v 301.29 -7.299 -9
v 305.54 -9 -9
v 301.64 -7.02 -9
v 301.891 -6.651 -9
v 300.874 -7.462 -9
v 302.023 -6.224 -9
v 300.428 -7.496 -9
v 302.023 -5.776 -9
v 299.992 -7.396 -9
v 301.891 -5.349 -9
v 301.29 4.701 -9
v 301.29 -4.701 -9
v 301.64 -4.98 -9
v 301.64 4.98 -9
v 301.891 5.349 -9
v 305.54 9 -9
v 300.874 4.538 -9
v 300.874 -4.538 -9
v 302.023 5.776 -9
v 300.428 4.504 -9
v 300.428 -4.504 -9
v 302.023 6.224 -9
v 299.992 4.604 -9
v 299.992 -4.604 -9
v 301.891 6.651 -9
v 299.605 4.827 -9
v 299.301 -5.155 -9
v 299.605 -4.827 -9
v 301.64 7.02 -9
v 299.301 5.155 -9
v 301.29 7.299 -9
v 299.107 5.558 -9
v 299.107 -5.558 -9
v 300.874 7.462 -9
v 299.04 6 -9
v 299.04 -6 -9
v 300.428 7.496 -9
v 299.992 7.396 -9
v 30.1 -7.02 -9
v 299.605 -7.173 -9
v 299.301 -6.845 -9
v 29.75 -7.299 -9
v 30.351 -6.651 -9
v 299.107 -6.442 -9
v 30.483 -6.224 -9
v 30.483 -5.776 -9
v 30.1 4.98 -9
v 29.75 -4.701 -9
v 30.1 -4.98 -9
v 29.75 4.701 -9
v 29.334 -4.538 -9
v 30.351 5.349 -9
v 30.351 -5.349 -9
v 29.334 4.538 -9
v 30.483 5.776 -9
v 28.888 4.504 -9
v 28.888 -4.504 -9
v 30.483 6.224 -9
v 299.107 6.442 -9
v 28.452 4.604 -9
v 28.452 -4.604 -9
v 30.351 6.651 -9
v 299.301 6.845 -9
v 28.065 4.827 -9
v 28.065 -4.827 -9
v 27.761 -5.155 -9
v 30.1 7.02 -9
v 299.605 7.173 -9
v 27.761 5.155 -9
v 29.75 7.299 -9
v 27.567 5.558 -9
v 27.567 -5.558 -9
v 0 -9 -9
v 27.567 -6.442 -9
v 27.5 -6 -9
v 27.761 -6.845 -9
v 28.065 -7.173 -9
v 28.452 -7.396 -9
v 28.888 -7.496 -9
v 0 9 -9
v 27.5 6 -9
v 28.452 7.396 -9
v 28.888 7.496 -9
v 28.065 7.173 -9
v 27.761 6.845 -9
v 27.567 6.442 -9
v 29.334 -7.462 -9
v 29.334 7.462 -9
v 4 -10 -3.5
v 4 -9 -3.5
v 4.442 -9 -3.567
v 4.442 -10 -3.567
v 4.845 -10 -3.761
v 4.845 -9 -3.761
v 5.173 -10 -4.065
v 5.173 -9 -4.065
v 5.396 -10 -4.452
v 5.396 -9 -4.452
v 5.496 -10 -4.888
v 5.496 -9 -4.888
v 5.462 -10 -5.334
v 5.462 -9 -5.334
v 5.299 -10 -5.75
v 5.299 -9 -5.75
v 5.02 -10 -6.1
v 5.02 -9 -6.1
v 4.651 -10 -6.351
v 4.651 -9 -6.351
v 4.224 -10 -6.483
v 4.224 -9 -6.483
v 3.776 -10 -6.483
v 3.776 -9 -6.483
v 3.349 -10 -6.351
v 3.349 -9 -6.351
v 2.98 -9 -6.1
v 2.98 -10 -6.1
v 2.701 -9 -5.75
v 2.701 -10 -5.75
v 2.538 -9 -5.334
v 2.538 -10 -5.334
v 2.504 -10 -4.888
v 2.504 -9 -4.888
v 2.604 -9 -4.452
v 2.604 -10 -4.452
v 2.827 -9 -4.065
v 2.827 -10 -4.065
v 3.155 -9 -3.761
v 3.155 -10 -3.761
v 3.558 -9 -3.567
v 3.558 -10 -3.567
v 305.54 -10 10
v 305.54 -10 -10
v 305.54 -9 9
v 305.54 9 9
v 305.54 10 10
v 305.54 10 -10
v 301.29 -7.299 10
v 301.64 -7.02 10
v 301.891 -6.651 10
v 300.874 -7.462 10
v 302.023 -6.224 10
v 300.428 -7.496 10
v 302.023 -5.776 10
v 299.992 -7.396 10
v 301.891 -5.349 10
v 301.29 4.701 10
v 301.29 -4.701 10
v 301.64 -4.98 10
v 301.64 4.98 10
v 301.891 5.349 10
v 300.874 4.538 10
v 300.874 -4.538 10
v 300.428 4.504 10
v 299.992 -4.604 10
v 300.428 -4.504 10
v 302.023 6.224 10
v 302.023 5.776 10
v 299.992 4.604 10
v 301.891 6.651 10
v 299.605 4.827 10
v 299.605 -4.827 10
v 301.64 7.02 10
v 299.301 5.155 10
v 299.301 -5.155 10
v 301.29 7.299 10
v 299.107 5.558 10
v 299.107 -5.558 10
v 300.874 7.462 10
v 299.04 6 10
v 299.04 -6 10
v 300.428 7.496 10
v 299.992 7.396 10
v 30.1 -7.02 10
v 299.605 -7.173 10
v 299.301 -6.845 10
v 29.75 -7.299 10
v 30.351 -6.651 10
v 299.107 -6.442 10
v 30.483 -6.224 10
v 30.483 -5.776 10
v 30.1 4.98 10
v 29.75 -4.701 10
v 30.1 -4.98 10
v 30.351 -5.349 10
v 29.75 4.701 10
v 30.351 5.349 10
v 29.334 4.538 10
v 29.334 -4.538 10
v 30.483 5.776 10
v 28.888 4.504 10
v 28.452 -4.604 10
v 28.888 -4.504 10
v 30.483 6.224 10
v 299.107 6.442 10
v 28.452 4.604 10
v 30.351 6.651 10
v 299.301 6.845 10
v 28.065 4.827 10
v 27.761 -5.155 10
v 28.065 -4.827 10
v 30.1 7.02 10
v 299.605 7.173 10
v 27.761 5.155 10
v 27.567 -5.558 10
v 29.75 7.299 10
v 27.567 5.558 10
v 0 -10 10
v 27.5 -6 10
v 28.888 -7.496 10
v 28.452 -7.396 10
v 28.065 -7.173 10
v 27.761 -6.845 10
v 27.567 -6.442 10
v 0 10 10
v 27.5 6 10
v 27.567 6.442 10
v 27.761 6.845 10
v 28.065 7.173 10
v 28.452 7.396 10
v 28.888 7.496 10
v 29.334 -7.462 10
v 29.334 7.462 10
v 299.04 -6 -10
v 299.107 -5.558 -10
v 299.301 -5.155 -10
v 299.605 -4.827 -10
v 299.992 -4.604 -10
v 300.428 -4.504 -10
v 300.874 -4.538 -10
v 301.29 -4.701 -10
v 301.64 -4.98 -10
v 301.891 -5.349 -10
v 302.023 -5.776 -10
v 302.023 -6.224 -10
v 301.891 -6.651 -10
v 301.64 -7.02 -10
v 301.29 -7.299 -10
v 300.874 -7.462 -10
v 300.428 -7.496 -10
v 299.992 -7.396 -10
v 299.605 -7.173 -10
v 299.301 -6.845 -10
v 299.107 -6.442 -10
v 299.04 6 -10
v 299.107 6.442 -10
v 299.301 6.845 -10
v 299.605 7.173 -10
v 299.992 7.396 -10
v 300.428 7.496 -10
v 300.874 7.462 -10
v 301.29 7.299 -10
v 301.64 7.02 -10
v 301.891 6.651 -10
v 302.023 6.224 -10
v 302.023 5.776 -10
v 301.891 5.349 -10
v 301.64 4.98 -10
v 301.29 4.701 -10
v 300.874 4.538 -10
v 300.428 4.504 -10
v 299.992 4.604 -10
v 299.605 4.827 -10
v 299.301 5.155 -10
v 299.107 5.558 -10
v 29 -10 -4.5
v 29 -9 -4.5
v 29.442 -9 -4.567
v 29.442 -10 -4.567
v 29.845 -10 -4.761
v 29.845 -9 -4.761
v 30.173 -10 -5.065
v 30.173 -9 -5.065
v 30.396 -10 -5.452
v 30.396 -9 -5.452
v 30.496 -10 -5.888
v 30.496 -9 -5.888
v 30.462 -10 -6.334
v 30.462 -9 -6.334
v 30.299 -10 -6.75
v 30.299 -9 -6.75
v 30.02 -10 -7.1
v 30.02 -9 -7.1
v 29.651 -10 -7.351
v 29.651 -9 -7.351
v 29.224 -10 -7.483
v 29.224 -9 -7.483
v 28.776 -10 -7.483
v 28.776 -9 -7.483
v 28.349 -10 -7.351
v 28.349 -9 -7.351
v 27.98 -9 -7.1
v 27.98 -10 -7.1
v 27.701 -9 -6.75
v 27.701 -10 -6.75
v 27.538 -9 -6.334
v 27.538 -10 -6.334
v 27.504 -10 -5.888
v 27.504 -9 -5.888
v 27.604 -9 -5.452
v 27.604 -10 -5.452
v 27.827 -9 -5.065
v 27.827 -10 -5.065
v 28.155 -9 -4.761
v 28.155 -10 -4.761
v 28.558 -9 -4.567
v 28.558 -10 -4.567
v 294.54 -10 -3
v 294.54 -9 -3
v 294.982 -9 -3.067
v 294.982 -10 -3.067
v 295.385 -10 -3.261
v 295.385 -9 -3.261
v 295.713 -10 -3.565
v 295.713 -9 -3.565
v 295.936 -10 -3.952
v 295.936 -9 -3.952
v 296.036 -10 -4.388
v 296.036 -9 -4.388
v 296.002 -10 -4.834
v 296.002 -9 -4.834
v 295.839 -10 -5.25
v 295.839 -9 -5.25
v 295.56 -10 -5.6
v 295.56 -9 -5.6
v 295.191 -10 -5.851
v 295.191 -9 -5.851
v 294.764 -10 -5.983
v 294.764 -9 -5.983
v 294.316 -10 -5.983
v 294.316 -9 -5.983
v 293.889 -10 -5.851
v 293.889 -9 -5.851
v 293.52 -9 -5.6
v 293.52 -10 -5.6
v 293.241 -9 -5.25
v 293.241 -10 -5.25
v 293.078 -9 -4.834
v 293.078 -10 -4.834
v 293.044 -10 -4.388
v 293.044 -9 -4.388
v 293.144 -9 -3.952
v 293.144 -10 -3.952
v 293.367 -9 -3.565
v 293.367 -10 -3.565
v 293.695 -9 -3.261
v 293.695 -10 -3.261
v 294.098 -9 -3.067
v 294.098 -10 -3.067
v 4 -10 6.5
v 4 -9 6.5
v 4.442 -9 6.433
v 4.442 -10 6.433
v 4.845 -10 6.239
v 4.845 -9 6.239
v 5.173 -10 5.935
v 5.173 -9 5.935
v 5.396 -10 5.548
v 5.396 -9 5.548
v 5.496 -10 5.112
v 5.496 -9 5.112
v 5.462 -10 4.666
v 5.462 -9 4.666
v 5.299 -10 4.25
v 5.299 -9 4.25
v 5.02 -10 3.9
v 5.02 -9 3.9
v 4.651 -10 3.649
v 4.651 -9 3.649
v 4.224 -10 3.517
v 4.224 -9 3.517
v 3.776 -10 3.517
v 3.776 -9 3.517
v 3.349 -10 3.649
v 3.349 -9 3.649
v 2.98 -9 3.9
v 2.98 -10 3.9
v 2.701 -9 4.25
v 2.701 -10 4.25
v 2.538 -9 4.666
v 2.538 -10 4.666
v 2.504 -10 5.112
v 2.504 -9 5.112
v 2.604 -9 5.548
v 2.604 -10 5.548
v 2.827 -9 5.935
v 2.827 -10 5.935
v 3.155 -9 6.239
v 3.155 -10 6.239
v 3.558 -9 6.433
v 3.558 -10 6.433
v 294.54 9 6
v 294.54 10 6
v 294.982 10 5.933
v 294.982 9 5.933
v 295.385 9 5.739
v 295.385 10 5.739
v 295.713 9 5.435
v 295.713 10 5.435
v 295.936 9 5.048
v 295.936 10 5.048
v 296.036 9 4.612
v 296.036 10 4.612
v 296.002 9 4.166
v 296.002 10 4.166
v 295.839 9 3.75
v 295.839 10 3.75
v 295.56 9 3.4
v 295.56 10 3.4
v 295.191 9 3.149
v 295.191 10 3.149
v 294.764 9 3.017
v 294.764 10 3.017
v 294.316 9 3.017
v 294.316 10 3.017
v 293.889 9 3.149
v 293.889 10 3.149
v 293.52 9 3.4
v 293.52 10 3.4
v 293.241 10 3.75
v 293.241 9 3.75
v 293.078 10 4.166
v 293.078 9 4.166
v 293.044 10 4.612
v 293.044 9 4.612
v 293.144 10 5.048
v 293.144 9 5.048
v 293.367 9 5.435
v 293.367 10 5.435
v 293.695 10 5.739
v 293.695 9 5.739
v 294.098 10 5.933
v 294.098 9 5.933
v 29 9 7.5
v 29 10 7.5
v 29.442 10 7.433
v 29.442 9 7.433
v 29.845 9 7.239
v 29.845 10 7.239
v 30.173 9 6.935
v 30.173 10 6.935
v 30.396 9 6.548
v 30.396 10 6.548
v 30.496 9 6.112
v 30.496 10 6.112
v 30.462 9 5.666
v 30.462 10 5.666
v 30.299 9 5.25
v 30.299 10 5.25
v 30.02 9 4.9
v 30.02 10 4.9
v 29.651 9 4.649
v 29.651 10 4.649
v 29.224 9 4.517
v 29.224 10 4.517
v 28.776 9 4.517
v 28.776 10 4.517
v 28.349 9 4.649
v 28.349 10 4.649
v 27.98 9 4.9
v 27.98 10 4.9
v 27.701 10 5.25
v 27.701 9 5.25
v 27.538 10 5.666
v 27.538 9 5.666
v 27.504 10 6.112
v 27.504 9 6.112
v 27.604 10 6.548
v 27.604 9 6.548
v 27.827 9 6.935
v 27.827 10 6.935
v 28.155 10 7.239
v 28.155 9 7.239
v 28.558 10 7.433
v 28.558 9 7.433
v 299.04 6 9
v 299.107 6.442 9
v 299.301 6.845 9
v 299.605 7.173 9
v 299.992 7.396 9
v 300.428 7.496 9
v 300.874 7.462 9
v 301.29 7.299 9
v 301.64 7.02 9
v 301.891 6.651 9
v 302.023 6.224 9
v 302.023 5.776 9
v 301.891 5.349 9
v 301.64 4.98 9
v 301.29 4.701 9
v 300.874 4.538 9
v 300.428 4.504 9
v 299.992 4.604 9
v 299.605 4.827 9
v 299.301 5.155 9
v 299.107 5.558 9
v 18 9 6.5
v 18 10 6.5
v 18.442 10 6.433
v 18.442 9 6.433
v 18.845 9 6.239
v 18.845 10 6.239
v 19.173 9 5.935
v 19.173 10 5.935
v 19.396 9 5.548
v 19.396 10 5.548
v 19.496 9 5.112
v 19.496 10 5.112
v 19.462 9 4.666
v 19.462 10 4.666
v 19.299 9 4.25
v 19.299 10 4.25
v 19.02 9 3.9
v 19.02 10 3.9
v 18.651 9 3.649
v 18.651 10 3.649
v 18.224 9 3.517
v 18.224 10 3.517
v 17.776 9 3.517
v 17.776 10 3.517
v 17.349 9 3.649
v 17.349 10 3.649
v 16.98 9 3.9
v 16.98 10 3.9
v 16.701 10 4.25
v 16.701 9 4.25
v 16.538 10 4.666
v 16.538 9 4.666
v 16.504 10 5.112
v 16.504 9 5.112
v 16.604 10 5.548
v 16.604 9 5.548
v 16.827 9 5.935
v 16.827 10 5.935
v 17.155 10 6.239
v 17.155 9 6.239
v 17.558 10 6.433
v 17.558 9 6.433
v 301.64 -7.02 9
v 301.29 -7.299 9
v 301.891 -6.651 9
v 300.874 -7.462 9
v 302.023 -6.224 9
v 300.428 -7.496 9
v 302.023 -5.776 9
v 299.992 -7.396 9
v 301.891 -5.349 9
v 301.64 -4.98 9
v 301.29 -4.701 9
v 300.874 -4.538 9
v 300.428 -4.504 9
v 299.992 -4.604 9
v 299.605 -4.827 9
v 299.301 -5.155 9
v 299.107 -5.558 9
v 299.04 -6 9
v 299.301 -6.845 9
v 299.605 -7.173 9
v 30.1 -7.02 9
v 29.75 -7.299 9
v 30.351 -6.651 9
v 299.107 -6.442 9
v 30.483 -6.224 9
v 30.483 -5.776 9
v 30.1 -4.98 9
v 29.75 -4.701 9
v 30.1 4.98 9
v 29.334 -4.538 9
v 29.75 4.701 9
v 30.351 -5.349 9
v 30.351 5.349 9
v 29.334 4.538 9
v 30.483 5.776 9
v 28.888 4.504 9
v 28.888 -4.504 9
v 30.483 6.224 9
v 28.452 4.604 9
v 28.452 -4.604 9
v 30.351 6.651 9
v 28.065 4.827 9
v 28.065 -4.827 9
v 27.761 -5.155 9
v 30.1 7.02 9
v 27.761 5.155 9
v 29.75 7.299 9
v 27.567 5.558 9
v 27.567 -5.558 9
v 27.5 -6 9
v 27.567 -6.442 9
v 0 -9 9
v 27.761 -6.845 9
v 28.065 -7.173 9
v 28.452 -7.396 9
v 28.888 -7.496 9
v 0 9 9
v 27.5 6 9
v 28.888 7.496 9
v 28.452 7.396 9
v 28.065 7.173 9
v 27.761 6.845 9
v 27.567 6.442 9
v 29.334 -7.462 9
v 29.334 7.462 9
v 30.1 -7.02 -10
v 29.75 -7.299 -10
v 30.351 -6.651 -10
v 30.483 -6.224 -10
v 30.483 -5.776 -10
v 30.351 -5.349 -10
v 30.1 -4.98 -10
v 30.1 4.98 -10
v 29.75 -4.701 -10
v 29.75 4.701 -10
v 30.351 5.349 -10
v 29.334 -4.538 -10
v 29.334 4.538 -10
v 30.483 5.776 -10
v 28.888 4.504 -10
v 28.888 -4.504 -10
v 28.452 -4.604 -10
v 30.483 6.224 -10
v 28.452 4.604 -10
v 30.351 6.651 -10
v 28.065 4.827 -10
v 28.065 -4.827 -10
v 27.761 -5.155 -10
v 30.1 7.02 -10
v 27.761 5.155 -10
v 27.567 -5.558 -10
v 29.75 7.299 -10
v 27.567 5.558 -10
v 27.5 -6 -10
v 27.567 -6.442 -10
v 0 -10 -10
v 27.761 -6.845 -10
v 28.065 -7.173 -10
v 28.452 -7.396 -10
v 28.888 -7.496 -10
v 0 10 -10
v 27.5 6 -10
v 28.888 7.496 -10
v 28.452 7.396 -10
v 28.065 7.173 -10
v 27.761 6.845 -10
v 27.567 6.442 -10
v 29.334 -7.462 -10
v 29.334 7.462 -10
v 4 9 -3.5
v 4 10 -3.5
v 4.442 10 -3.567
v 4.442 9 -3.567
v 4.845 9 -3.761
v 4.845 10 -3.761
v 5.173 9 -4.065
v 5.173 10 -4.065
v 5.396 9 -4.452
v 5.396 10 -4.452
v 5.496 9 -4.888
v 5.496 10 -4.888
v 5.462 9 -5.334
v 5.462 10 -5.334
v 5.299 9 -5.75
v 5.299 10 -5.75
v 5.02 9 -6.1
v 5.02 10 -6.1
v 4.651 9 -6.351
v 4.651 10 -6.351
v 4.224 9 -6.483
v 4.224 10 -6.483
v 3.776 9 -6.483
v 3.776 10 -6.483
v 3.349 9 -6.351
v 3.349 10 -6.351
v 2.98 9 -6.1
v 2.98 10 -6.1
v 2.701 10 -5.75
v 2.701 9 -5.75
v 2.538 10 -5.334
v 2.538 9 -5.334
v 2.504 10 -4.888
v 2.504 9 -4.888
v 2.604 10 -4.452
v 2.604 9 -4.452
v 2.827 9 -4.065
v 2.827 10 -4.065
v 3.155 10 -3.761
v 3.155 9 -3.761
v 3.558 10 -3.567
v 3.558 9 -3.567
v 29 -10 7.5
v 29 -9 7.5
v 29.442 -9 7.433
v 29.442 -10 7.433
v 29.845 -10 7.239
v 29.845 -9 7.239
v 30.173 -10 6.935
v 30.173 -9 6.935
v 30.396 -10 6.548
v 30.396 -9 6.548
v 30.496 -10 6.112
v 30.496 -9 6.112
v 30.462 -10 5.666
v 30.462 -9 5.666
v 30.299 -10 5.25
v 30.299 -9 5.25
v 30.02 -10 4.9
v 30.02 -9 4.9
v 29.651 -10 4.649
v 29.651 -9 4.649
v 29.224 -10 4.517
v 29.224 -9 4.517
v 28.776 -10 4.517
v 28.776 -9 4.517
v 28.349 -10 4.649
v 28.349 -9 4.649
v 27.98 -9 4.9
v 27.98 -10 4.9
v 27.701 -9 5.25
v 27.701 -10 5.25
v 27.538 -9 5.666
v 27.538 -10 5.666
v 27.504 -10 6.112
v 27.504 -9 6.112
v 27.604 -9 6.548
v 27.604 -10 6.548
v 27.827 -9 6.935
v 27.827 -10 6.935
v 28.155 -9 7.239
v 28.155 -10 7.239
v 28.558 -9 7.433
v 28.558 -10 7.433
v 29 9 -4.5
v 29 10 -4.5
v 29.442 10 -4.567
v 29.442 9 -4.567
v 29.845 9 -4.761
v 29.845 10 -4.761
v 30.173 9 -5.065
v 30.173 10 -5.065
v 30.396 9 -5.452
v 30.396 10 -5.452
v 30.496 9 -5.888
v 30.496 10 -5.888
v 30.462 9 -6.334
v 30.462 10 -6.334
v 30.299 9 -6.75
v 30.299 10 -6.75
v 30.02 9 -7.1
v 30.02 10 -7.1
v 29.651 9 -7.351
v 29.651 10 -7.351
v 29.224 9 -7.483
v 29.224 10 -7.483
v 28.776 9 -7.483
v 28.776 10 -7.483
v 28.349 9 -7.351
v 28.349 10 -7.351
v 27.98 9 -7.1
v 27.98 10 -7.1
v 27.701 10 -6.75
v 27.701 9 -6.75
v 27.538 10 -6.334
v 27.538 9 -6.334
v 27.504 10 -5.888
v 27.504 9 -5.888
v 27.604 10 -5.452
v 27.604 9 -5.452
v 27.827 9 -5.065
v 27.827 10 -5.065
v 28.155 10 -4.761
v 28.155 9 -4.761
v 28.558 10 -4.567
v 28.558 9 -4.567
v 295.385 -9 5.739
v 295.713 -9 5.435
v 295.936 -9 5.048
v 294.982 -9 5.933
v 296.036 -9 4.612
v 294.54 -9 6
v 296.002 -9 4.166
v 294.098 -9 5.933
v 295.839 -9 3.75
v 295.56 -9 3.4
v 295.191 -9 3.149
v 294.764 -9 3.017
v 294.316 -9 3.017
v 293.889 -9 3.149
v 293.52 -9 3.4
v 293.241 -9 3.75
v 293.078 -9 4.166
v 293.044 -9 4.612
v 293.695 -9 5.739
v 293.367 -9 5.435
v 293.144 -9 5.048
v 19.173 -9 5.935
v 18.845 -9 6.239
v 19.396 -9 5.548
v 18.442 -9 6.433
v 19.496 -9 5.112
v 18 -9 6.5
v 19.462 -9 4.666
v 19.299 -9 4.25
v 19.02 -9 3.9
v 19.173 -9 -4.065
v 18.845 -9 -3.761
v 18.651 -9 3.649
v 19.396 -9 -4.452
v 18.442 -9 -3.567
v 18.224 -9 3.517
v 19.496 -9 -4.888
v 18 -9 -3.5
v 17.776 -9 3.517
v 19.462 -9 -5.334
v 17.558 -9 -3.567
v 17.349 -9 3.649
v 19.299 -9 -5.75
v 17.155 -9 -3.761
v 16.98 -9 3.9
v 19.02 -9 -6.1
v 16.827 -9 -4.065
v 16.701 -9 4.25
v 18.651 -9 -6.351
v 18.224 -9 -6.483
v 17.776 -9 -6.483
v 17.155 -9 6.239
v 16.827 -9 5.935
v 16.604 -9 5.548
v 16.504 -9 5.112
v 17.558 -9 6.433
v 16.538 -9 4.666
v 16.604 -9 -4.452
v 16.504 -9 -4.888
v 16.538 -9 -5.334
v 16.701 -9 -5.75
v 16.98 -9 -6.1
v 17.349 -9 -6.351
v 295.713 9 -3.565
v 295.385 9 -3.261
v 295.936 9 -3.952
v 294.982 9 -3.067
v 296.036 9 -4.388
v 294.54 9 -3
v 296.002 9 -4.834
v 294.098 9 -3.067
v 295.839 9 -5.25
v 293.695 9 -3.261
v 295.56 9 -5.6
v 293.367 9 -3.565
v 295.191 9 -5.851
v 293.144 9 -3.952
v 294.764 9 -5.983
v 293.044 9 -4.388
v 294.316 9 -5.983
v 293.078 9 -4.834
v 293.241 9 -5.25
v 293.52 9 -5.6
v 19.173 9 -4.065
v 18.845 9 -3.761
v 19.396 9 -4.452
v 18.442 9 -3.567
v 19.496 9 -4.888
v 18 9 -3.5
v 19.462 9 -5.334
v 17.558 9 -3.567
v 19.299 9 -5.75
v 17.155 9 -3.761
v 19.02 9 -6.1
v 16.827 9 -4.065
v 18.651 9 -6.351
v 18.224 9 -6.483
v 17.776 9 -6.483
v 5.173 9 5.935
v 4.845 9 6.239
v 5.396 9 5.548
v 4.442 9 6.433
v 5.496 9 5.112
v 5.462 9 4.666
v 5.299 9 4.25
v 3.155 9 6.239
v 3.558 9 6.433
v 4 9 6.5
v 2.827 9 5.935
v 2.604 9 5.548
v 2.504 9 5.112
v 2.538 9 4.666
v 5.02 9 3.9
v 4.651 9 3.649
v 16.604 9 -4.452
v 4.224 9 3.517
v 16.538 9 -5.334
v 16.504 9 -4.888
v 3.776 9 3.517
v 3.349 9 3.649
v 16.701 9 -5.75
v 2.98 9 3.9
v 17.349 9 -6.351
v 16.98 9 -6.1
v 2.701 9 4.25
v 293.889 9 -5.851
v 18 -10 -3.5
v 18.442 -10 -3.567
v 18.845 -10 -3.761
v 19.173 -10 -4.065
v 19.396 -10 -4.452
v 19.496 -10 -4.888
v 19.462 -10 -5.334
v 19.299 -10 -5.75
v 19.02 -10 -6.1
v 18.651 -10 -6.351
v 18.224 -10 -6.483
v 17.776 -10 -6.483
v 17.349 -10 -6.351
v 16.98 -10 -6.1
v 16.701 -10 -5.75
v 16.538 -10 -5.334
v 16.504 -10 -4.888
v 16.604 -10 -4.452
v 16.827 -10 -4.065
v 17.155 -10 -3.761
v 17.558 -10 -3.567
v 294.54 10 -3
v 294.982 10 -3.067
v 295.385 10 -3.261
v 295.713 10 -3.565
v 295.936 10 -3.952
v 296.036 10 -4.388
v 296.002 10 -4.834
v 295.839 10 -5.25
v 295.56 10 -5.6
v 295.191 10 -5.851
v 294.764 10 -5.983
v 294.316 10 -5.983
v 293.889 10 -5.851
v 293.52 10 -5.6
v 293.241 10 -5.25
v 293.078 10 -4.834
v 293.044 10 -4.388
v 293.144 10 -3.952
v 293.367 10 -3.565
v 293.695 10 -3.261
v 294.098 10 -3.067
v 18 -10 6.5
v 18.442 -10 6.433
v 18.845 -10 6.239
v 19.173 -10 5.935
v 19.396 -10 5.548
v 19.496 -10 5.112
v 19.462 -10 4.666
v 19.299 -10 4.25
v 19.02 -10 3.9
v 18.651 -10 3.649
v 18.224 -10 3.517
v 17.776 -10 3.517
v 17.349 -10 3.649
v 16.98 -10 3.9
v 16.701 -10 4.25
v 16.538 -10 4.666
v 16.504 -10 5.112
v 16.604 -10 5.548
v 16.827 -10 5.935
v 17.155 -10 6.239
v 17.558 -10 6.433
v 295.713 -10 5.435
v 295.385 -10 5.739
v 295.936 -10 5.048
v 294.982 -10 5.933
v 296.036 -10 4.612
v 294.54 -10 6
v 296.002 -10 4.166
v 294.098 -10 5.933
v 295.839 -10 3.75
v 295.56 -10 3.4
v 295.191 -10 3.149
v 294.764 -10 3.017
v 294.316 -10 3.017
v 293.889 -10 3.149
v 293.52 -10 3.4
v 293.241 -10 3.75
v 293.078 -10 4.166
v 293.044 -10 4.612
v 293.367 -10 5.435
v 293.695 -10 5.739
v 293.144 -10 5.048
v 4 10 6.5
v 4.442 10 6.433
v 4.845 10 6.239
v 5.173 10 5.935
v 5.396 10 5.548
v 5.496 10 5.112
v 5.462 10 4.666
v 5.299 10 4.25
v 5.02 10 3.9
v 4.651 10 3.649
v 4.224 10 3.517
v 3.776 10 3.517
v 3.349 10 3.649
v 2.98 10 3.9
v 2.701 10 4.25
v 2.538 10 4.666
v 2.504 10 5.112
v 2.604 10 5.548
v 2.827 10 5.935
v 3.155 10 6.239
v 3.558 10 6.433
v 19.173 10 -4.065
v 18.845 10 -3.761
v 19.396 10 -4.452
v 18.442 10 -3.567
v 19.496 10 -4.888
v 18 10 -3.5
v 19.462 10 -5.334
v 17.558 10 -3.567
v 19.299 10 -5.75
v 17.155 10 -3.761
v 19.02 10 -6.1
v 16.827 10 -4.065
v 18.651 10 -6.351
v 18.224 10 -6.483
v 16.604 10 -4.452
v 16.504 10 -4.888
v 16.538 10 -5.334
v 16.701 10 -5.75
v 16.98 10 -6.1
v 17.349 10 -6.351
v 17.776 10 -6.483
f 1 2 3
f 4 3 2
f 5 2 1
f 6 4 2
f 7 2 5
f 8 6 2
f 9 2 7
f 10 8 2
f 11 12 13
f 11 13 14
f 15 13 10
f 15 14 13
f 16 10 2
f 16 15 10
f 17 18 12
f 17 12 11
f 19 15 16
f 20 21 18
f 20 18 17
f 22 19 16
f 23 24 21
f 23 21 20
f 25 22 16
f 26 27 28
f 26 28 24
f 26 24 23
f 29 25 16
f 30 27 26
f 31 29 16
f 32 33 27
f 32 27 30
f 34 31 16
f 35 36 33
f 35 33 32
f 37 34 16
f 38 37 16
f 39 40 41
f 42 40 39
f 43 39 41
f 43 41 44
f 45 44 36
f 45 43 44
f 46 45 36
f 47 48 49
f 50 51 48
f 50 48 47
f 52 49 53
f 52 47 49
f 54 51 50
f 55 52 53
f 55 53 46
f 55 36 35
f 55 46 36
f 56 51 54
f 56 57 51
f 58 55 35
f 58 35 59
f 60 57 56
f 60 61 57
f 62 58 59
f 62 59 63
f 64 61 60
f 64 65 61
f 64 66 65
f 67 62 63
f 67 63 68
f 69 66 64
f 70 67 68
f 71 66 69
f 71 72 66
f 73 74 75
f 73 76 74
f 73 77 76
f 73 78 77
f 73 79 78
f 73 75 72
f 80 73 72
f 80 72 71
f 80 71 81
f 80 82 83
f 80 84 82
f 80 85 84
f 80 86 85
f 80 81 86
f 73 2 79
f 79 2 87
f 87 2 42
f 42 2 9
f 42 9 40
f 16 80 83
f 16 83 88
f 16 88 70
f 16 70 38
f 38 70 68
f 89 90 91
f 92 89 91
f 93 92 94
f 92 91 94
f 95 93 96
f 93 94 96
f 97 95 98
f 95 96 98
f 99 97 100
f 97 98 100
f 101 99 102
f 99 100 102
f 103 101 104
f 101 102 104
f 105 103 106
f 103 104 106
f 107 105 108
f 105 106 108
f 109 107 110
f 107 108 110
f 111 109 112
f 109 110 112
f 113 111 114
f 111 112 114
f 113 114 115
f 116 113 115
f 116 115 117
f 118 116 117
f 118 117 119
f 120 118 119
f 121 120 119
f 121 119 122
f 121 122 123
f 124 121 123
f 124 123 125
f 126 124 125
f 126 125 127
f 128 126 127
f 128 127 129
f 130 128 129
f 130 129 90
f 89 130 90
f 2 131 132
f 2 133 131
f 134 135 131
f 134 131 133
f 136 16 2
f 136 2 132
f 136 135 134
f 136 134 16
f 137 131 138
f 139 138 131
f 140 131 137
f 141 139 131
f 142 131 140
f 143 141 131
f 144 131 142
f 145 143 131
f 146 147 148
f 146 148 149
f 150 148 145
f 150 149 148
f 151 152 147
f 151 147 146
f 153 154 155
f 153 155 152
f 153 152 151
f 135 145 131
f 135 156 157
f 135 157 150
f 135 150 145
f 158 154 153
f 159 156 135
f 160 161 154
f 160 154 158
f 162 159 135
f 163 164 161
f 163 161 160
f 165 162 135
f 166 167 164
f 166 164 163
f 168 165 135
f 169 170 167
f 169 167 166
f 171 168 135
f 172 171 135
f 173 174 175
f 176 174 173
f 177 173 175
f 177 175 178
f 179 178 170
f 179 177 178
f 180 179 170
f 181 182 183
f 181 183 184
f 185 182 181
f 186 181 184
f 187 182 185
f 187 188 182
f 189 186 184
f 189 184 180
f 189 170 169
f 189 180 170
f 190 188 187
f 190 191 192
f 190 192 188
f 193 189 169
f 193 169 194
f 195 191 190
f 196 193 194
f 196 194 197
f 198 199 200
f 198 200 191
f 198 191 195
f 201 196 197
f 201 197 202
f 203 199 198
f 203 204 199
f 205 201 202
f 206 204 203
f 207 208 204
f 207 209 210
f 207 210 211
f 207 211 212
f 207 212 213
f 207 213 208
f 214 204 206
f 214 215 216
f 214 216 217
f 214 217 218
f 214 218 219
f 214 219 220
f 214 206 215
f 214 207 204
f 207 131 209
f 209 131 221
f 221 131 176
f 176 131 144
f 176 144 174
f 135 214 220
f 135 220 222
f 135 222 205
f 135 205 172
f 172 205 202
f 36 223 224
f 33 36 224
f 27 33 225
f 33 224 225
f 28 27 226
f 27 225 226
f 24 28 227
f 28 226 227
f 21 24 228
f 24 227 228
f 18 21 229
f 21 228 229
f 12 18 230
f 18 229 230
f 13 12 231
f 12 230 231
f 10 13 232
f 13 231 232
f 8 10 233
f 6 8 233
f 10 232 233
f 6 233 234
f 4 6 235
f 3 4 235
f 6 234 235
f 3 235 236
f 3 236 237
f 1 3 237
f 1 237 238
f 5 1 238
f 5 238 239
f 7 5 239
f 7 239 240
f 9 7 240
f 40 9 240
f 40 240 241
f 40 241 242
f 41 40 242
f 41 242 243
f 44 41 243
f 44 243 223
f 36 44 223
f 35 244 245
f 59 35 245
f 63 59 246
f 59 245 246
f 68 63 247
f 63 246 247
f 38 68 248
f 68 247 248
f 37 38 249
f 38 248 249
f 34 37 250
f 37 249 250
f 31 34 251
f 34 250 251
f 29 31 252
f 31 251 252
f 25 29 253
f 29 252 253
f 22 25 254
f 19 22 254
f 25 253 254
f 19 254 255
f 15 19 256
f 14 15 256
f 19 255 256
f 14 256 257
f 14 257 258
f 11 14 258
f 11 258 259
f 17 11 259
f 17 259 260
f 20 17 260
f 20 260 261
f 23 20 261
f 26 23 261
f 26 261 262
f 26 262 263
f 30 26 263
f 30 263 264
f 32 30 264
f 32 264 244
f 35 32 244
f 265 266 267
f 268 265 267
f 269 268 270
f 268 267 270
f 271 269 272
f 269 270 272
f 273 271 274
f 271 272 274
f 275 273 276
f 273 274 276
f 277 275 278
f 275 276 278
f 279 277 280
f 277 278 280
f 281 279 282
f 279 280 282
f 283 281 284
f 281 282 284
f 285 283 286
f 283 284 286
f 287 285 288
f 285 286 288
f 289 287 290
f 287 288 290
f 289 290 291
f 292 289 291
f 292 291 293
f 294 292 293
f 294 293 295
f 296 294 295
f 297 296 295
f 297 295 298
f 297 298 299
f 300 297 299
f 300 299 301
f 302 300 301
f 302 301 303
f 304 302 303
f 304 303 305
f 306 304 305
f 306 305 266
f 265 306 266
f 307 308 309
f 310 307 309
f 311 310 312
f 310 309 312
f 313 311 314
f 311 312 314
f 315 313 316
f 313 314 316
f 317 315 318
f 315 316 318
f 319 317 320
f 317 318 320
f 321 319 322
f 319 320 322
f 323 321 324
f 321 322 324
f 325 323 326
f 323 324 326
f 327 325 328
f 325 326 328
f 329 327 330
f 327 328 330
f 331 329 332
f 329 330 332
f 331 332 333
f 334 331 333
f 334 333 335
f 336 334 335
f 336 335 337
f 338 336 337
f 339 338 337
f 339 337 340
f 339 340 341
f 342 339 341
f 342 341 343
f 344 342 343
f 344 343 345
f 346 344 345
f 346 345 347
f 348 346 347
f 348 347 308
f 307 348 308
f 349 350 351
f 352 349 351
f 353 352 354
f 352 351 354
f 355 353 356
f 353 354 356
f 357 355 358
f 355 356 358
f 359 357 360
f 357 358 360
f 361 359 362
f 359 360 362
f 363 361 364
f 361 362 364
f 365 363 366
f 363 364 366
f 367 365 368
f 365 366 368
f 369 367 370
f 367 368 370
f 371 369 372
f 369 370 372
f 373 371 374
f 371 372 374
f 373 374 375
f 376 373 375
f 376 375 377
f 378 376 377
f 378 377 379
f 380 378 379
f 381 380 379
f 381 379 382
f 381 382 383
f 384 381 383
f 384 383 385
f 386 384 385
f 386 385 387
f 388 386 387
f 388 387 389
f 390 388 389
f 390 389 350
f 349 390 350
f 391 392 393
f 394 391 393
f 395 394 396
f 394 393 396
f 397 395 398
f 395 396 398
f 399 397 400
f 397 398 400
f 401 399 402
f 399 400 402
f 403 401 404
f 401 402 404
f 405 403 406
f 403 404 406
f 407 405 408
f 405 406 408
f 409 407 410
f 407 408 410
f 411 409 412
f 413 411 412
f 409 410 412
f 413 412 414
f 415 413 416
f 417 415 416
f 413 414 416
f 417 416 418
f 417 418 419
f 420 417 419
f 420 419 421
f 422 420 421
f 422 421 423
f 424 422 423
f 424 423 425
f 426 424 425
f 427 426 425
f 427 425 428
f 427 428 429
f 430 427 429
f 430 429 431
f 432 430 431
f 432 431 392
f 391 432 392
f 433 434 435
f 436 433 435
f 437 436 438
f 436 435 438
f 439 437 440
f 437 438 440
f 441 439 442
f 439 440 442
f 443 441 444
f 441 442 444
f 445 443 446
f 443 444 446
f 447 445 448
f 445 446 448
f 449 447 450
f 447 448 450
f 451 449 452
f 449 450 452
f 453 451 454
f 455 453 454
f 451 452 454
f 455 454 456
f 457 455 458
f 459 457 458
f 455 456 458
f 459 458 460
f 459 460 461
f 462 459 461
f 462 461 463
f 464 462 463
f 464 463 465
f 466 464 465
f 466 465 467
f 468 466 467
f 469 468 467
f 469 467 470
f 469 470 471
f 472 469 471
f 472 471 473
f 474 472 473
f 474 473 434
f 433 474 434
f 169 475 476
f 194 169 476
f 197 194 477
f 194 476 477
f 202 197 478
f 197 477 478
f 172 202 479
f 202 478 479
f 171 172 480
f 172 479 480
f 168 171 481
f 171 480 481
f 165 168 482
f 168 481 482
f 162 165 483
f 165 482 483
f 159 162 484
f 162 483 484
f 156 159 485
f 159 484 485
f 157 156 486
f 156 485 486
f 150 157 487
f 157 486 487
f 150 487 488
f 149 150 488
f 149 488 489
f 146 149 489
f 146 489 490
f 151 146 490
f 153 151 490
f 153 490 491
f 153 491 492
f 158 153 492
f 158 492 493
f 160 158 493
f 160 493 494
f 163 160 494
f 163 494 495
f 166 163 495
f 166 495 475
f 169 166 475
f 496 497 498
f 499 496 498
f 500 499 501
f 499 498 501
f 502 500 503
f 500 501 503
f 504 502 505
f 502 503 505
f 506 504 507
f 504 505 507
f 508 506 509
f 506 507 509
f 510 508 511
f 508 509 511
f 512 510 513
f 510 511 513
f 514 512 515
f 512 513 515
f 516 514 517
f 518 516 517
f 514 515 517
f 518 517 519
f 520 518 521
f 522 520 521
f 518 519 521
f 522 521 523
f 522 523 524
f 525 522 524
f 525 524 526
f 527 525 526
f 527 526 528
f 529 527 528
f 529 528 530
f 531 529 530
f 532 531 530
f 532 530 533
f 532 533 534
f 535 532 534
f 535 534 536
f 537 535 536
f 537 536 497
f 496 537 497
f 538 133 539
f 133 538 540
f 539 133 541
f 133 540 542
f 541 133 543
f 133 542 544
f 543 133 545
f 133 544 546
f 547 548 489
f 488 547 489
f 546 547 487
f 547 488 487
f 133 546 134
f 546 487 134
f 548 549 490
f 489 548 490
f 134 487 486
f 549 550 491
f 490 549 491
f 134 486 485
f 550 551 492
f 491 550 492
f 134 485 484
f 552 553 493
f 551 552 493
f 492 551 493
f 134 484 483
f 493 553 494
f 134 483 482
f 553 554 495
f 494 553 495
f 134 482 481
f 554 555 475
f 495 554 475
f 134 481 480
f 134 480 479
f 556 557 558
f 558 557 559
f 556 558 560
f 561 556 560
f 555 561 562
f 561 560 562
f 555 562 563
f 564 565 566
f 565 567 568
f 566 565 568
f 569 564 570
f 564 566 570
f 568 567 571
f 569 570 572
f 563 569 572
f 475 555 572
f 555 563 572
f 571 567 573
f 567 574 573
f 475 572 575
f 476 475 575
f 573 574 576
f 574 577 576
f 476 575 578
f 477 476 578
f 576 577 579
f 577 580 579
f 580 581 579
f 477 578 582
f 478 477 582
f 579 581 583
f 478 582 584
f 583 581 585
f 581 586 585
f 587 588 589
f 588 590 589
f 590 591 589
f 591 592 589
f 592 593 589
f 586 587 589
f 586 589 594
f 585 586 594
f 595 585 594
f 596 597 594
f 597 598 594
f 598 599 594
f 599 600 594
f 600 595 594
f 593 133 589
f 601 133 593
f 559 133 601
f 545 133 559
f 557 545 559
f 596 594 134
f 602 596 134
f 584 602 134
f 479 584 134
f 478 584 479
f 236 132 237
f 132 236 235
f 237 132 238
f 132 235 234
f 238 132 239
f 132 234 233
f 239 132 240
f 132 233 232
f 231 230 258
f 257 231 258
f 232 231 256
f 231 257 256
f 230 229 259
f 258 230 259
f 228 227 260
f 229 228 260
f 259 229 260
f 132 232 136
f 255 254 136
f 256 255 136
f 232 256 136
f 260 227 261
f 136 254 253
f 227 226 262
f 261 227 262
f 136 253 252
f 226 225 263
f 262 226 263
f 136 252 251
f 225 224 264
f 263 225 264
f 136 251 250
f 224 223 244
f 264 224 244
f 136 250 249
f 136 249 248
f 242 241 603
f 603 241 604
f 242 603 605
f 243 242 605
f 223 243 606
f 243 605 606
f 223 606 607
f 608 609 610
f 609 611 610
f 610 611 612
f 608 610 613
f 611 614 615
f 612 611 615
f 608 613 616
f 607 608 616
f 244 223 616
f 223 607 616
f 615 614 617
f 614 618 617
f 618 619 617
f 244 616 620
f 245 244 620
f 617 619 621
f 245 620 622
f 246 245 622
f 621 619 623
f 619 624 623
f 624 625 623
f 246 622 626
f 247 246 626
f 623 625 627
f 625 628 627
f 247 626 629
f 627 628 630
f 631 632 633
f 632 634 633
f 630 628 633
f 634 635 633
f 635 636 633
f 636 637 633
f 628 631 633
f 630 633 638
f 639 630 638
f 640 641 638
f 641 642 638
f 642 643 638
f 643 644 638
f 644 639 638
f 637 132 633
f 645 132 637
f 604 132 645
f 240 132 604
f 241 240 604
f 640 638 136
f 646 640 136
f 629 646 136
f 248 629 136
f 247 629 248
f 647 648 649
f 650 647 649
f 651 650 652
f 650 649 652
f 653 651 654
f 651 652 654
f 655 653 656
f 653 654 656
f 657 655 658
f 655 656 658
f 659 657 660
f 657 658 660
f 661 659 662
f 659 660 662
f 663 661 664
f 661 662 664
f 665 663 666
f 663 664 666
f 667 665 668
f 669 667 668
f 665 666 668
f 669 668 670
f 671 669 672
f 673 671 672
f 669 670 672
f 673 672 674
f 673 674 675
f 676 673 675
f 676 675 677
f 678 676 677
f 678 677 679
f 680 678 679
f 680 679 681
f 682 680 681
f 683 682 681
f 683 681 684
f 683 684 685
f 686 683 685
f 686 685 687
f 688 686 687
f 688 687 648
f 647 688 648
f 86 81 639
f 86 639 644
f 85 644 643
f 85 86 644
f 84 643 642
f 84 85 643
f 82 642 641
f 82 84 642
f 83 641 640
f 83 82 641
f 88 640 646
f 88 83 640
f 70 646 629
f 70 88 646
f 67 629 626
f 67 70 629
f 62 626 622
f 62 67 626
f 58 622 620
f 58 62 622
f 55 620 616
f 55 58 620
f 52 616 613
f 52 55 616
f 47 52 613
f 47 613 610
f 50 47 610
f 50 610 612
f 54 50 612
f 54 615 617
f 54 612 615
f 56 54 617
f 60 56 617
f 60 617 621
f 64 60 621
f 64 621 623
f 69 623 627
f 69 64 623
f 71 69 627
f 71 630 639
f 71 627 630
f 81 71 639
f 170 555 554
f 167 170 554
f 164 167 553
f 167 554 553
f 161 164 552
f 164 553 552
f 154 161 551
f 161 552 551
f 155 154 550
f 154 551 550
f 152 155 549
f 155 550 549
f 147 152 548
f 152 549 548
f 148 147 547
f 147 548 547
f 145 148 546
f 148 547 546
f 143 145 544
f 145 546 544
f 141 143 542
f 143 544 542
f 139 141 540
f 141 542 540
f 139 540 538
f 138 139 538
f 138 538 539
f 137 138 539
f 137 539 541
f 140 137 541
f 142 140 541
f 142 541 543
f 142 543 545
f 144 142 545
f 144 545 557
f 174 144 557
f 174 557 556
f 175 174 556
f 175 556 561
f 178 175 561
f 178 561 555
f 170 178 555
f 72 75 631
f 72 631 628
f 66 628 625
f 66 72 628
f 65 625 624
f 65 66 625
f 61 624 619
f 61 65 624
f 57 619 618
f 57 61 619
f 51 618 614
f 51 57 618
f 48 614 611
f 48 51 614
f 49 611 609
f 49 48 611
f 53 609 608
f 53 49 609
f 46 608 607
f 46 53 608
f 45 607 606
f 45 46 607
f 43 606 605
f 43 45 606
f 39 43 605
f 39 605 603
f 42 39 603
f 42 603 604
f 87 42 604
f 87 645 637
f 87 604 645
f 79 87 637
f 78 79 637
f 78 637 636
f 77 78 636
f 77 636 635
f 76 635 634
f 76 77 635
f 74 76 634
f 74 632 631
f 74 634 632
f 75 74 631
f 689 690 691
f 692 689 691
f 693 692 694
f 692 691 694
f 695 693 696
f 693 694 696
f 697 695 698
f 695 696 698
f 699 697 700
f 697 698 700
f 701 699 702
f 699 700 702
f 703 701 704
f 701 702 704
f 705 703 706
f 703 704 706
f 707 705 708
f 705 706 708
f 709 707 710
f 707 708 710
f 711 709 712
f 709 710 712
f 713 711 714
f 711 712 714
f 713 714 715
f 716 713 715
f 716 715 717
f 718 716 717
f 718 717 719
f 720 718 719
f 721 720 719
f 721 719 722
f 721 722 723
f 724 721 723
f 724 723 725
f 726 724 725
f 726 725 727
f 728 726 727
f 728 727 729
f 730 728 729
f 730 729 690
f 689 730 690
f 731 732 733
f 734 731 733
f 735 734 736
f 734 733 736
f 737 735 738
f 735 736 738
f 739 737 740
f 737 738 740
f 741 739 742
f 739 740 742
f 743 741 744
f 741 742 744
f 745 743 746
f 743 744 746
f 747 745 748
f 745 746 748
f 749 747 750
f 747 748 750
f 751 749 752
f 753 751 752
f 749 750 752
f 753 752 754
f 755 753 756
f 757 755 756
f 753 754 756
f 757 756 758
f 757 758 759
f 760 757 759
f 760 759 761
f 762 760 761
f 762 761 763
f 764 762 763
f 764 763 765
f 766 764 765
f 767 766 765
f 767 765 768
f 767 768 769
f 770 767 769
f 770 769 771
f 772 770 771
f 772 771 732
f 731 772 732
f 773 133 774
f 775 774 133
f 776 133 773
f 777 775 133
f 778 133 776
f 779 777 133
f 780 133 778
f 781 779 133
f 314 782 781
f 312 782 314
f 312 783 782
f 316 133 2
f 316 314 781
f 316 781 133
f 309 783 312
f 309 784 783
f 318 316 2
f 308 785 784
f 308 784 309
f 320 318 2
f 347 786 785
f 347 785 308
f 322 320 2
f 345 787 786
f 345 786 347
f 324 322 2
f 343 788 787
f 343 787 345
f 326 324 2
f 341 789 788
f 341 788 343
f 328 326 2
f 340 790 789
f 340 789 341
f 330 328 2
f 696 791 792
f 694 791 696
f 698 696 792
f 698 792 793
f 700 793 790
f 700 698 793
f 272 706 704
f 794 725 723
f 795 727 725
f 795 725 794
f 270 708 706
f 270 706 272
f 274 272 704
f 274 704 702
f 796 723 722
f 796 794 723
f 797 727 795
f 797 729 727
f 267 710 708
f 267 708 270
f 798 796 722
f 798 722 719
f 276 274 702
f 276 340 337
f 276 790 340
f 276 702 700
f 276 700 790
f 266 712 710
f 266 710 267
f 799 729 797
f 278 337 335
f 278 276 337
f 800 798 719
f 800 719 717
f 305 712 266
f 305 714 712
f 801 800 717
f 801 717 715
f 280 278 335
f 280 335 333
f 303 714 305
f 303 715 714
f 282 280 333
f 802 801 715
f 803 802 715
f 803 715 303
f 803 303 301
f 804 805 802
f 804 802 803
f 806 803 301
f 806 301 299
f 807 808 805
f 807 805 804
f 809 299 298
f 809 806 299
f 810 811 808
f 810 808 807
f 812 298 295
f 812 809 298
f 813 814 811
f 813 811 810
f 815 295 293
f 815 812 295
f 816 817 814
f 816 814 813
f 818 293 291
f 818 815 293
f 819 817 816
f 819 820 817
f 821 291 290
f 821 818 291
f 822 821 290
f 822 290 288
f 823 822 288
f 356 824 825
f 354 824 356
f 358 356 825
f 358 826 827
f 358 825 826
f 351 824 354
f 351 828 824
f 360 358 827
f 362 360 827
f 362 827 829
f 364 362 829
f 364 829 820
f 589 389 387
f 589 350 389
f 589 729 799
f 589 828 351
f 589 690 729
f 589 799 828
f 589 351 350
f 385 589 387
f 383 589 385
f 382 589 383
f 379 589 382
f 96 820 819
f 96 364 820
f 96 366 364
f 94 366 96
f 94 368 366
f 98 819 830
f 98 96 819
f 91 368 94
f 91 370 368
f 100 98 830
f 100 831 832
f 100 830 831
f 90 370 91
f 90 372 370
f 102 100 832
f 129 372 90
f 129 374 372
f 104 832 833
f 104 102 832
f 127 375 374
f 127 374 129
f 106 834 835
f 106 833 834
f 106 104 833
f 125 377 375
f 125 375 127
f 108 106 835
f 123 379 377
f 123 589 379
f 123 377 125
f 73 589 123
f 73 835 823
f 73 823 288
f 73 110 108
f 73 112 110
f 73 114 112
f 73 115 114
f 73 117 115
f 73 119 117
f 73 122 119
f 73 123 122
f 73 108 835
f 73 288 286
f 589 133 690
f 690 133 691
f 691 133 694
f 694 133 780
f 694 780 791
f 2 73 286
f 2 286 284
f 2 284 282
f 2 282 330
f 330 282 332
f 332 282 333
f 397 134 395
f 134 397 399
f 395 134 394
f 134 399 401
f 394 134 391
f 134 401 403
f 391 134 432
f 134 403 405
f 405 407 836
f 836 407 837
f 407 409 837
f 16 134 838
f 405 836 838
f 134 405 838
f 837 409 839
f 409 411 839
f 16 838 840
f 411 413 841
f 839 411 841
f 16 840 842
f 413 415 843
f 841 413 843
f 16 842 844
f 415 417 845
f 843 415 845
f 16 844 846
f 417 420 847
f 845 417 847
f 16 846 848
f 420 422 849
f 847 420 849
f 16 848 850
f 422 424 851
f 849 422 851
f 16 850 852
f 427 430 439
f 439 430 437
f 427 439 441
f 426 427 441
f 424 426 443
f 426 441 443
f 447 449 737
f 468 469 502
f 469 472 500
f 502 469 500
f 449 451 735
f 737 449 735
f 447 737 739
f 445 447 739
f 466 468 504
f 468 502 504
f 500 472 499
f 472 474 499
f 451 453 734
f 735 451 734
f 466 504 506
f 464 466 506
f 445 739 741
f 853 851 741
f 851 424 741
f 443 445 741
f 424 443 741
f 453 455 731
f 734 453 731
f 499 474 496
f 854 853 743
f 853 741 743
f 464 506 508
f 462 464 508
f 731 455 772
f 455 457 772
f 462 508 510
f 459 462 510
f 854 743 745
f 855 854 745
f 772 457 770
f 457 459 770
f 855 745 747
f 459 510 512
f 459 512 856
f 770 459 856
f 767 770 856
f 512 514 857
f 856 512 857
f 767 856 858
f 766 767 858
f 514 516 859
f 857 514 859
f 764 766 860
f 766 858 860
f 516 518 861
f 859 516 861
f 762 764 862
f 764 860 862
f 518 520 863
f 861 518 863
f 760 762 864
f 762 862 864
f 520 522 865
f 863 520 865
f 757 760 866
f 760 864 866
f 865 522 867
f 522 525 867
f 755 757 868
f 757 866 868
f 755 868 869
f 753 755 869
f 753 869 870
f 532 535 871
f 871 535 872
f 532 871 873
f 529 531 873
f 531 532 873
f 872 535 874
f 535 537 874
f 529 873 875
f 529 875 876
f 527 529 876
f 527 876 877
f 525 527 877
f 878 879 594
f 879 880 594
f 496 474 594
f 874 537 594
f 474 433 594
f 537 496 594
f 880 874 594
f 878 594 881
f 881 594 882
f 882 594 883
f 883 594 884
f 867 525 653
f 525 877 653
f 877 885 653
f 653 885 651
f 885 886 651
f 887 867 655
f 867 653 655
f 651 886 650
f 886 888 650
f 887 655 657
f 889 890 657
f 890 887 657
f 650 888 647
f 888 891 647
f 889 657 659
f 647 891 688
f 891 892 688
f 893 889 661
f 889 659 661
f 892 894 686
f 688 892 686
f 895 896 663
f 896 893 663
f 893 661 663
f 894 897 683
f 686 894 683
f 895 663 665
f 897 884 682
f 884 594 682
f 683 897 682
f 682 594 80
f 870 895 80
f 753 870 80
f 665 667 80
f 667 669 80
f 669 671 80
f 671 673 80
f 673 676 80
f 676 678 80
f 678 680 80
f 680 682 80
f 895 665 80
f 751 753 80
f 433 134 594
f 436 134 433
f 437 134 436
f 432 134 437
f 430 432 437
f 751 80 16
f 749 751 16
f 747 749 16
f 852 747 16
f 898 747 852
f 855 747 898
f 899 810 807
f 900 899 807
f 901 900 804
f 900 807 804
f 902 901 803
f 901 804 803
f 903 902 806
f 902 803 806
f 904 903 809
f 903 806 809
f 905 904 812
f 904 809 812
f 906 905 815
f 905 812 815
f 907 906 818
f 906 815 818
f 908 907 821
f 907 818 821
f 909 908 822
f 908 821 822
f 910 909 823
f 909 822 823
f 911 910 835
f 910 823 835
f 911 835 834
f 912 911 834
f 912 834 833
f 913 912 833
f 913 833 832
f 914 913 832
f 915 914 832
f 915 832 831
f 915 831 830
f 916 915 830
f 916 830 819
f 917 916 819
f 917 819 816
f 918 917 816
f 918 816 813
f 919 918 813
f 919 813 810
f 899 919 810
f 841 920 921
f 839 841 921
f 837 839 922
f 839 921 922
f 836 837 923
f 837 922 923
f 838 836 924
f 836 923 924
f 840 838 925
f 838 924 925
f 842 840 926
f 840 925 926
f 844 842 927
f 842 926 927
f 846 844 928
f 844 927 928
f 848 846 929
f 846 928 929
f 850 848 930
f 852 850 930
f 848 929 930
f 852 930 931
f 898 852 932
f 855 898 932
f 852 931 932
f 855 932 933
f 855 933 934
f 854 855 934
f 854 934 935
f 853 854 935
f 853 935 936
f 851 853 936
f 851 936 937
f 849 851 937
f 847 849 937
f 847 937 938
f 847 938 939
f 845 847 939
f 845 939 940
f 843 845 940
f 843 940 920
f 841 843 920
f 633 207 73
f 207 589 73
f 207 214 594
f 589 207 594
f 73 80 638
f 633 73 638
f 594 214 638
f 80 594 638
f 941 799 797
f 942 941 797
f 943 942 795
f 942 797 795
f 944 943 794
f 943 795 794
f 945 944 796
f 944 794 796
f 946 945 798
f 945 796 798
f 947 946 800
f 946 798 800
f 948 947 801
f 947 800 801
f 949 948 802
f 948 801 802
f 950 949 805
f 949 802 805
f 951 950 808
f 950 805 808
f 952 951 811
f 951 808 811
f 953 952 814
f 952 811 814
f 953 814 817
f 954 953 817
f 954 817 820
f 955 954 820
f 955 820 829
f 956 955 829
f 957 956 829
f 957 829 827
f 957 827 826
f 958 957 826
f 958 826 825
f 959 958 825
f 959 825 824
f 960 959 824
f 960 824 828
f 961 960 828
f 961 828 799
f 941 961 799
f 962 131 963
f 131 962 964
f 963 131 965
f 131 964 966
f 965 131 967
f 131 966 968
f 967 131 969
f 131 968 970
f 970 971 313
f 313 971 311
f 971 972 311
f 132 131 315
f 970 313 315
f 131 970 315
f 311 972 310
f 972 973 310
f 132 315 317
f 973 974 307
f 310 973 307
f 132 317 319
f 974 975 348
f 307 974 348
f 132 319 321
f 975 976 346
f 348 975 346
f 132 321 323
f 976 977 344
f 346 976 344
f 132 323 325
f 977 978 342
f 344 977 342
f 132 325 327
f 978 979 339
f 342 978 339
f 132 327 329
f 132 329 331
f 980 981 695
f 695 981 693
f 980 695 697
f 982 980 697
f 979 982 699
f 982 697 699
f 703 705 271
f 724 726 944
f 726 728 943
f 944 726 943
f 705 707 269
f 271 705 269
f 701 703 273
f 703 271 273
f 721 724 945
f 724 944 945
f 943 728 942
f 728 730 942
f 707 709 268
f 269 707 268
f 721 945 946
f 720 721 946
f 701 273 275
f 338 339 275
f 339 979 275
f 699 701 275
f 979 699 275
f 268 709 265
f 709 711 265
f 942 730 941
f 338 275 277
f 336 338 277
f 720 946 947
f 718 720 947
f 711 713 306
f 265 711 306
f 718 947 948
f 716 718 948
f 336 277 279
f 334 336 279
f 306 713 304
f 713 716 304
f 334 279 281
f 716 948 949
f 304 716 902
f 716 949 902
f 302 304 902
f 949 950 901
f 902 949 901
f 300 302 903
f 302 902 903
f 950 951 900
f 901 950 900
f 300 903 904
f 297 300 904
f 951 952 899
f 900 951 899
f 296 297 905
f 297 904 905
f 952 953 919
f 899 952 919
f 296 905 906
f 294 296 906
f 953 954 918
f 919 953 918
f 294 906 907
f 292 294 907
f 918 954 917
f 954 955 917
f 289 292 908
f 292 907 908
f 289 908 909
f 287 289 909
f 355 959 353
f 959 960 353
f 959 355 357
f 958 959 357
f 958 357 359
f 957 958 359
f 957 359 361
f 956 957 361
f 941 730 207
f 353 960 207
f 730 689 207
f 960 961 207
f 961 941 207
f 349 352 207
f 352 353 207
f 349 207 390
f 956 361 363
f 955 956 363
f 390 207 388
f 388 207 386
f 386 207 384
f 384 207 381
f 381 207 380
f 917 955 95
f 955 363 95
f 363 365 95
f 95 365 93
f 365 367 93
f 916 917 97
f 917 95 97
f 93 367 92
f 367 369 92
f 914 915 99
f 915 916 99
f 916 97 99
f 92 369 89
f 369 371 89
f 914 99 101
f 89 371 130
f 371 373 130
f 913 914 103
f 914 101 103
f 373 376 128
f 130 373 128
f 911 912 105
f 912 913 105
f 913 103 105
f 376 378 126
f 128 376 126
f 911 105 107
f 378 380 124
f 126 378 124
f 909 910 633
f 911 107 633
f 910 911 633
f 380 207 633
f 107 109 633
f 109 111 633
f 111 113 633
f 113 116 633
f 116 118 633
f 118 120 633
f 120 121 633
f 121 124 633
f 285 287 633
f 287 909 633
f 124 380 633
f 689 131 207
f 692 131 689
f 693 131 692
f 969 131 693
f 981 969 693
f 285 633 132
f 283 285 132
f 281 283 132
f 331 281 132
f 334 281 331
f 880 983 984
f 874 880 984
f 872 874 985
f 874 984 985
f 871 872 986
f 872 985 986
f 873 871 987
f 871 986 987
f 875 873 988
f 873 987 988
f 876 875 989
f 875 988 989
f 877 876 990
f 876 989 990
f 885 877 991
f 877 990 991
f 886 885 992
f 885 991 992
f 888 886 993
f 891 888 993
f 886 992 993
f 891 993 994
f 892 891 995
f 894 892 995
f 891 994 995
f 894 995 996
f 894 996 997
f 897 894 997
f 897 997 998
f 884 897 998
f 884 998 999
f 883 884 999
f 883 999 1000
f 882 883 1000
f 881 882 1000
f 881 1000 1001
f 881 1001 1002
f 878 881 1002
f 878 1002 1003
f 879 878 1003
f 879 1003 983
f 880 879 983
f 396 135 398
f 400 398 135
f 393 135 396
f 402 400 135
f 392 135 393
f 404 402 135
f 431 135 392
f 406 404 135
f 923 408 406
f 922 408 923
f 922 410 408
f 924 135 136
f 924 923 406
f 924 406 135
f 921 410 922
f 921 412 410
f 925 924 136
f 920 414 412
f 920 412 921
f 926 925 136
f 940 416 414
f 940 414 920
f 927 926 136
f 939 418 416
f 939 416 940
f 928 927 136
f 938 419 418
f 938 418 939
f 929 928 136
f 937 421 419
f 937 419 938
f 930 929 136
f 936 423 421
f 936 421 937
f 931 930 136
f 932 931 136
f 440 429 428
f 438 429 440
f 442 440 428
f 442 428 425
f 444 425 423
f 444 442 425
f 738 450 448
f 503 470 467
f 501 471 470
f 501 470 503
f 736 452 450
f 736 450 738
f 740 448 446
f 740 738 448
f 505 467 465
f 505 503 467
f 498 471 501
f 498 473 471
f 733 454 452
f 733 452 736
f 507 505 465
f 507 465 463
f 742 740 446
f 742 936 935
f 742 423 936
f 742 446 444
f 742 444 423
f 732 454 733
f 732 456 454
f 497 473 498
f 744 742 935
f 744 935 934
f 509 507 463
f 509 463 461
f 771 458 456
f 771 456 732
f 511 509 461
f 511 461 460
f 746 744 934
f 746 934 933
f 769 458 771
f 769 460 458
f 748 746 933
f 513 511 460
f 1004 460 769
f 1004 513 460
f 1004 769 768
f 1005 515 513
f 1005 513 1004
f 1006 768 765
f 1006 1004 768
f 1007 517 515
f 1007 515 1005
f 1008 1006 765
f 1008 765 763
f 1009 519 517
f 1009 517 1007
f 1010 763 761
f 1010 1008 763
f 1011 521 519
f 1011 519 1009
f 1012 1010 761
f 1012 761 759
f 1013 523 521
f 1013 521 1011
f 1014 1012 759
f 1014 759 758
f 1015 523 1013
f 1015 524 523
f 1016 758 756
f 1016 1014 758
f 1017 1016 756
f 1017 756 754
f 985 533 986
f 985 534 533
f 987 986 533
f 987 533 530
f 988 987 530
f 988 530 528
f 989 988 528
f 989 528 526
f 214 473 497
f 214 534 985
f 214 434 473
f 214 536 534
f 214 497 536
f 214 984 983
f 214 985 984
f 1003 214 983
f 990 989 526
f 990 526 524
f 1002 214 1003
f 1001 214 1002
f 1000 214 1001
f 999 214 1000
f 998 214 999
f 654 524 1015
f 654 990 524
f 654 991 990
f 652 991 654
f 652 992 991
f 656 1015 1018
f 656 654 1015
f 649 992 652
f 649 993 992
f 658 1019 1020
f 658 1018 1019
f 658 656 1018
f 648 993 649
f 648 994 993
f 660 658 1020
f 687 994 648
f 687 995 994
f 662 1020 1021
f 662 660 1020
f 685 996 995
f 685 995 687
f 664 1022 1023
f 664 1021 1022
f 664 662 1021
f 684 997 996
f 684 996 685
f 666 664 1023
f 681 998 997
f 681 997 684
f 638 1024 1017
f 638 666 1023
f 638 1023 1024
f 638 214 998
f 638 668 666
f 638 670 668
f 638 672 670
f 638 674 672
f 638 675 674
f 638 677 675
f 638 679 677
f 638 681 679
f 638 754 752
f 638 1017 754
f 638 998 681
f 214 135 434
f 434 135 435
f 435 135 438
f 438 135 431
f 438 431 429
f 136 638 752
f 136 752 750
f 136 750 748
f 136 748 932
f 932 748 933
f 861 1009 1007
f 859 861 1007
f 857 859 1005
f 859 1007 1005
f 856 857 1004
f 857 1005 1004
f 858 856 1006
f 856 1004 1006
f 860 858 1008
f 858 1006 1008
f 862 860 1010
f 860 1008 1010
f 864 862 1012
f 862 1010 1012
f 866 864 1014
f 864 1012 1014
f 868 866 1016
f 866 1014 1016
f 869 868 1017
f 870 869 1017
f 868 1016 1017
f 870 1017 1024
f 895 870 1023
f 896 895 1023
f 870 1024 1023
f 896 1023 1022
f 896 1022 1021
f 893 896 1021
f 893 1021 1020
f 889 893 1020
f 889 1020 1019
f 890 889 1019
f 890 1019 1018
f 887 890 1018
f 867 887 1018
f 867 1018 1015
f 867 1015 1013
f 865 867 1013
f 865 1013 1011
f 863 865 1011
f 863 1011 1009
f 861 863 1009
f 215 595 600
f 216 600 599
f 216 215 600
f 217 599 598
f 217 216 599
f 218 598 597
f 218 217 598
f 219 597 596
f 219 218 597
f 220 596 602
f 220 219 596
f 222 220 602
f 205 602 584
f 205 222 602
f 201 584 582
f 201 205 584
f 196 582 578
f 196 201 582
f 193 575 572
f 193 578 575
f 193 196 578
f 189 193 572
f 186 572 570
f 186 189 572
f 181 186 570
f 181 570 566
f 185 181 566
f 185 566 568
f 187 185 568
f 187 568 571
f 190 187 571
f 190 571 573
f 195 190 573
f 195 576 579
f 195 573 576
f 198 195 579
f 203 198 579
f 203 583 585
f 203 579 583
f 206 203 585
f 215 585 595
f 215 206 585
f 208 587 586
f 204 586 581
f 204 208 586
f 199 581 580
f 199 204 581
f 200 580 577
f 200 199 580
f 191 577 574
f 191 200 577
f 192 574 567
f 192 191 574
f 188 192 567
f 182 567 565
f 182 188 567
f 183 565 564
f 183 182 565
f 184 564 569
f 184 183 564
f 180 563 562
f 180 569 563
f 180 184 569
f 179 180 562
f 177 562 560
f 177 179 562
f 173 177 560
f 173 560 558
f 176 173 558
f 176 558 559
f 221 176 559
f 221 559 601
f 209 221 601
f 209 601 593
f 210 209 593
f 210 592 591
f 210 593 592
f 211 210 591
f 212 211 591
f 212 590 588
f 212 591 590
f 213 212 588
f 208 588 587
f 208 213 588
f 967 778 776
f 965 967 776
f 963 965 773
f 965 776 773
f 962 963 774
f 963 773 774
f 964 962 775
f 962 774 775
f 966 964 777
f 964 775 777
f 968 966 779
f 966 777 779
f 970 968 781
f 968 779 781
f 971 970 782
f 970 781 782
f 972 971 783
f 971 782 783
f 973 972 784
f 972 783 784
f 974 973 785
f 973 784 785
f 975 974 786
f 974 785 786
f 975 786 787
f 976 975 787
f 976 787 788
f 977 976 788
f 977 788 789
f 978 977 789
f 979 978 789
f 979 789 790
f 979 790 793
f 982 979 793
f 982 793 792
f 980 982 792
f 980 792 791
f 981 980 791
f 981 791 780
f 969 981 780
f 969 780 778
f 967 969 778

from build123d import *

# Parameters (mm, degrees)
SKETCH_11_W         = 20
SKETCH_11_H         = 20
SKETCH_11_W_2       = 18
SKETCH_11_H_2       = 18
F_20X20X1_1_DEPTH   = 305.54
SKETCH_16_R         = 1.5
CUT_EXTRUDE_3_DEPTH = 307.357130813
SKETCH_18_R         = 1.5
CUT_EXTRUDE_5_DEPTH = 307.357130813
SKETCH_14_R         = 1.5
CUT_EXTRUDE_6_DEPTH = 20
SKETCH_17_R         = 1.5
CUT_EXTRUDE_7_DEPTH = 20
SKETCH_15_R         = 1.5
CUT_EXTRUDE_8_DEPTH = 20


with BuildPart() as part:
    # 草图11 → 铝管 20X20X1(1) (new body)
    with BuildSketch(Plane(origin=(0, 0, 0), x_dir=(0, 0, -1), z_dir=(1, 0, 0))):
        Rectangle(SKETCH_11_W, SKETCH_11_H)
        Rectangle(SKETCH_11_W_2, SKETCH_11_H_2, mode=Mode.SUBTRACT)
    extrude(amount=F_20X20X1_1_DEPTH)

    # 草图16 → 切除-拉伸3 (cut, through all)
    with BuildSketch(Plane(origin=(0, 0, 10), x_dir=(1, 0, 0), z_dir=(0, 0, -1))):
        with Locations(Location((29, -6, 0), (0, 0, 180))):
            Circle(SKETCH_16_R)
        with Locations(Location((29, 6, 0), (0, 0, 180))):
            Circle(SKETCH_16_R)
    extrude(amount=CUT_EXTRUDE_3_DEPTH, mode=Mode.SUBTRACT)

    # 草图18 → 切除-拉伸5 (cut, through all)
    with BuildSketch(Plane(origin=(0, 10, 0), x_dir=(1, 0, 0), z_dir=(0, 1, 0))):
        with Locations(Location((29, 6, 0), (0, 0, 270))):
            Circle(SKETCH_18_R)
        with Locations(Location((29, -6, 0), (0, 0, 270))):
            Circle(SKETCH_18_R)
    extrude(amount=-CUT_EXTRUDE_5_DEPTH, mode=Mode.SUBTRACT)

    # 草图14 → 切除-拉伸6 (cut)
    with BuildSketch(Plane(origin=(0, 10, 0), x_dir=(1, 0, 0), z_dir=(0, 1, 0))):
        with Locations(Location((294.54, 4.5, 0), (0, 0, 270))):
            Circle(SKETCH_14_R)
        with Locations(Location((294.54, -4.5, 0), (0, 0, 270))):
            Circle(SKETCH_14_R)
    extrude(amount=-CUT_EXTRUDE_6_DEPTH, mode=Mode.SUBTRACT)

    # 草图17 → 切除-拉伸7 (cut)
    with BuildSketch(Plane(origin=(0, 0, -10), x_dir=(-1, 0, 0), z_dir=(0, 0, -1))):
        with Locations((-300.54, 6)):
            Circle(SKETCH_17_R)
        with Locations((-300.54, -6)):
            Circle(SKETCH_17_R)
    extrude(amount=-CUT_EXTRUDE_7_DEPTH, mode=Mode.SUBTRACT)

    # 草图15 → 切除-拉伸8 (cut)
    with BuildSketch(Plane(origin=(0, 10, 0), x_dir=(1, 0, 0), z_dir=(0, 1, 0))):
        with Locations(Location((4, 5, 0), (0, 0, 270))):
            Circle(SKETCH_15_R)
        with Locations(Location((4, -5, 0), (0, 0, 270))):
            Circle(SKETCH_15_R)
        with Locations(Location((18, 5, 0), (0, 0, 270))):
            Circle(SKETCH_15_R)
        with Locations(Location((18, -5, 0), (0, 0, 270))):
            Circle(SKETCH_15_R)
    extrude(amount=-CUT_EXTRUDE_8_DEPTH, mode=Mode.SUBTRACT)


solid = part.part
